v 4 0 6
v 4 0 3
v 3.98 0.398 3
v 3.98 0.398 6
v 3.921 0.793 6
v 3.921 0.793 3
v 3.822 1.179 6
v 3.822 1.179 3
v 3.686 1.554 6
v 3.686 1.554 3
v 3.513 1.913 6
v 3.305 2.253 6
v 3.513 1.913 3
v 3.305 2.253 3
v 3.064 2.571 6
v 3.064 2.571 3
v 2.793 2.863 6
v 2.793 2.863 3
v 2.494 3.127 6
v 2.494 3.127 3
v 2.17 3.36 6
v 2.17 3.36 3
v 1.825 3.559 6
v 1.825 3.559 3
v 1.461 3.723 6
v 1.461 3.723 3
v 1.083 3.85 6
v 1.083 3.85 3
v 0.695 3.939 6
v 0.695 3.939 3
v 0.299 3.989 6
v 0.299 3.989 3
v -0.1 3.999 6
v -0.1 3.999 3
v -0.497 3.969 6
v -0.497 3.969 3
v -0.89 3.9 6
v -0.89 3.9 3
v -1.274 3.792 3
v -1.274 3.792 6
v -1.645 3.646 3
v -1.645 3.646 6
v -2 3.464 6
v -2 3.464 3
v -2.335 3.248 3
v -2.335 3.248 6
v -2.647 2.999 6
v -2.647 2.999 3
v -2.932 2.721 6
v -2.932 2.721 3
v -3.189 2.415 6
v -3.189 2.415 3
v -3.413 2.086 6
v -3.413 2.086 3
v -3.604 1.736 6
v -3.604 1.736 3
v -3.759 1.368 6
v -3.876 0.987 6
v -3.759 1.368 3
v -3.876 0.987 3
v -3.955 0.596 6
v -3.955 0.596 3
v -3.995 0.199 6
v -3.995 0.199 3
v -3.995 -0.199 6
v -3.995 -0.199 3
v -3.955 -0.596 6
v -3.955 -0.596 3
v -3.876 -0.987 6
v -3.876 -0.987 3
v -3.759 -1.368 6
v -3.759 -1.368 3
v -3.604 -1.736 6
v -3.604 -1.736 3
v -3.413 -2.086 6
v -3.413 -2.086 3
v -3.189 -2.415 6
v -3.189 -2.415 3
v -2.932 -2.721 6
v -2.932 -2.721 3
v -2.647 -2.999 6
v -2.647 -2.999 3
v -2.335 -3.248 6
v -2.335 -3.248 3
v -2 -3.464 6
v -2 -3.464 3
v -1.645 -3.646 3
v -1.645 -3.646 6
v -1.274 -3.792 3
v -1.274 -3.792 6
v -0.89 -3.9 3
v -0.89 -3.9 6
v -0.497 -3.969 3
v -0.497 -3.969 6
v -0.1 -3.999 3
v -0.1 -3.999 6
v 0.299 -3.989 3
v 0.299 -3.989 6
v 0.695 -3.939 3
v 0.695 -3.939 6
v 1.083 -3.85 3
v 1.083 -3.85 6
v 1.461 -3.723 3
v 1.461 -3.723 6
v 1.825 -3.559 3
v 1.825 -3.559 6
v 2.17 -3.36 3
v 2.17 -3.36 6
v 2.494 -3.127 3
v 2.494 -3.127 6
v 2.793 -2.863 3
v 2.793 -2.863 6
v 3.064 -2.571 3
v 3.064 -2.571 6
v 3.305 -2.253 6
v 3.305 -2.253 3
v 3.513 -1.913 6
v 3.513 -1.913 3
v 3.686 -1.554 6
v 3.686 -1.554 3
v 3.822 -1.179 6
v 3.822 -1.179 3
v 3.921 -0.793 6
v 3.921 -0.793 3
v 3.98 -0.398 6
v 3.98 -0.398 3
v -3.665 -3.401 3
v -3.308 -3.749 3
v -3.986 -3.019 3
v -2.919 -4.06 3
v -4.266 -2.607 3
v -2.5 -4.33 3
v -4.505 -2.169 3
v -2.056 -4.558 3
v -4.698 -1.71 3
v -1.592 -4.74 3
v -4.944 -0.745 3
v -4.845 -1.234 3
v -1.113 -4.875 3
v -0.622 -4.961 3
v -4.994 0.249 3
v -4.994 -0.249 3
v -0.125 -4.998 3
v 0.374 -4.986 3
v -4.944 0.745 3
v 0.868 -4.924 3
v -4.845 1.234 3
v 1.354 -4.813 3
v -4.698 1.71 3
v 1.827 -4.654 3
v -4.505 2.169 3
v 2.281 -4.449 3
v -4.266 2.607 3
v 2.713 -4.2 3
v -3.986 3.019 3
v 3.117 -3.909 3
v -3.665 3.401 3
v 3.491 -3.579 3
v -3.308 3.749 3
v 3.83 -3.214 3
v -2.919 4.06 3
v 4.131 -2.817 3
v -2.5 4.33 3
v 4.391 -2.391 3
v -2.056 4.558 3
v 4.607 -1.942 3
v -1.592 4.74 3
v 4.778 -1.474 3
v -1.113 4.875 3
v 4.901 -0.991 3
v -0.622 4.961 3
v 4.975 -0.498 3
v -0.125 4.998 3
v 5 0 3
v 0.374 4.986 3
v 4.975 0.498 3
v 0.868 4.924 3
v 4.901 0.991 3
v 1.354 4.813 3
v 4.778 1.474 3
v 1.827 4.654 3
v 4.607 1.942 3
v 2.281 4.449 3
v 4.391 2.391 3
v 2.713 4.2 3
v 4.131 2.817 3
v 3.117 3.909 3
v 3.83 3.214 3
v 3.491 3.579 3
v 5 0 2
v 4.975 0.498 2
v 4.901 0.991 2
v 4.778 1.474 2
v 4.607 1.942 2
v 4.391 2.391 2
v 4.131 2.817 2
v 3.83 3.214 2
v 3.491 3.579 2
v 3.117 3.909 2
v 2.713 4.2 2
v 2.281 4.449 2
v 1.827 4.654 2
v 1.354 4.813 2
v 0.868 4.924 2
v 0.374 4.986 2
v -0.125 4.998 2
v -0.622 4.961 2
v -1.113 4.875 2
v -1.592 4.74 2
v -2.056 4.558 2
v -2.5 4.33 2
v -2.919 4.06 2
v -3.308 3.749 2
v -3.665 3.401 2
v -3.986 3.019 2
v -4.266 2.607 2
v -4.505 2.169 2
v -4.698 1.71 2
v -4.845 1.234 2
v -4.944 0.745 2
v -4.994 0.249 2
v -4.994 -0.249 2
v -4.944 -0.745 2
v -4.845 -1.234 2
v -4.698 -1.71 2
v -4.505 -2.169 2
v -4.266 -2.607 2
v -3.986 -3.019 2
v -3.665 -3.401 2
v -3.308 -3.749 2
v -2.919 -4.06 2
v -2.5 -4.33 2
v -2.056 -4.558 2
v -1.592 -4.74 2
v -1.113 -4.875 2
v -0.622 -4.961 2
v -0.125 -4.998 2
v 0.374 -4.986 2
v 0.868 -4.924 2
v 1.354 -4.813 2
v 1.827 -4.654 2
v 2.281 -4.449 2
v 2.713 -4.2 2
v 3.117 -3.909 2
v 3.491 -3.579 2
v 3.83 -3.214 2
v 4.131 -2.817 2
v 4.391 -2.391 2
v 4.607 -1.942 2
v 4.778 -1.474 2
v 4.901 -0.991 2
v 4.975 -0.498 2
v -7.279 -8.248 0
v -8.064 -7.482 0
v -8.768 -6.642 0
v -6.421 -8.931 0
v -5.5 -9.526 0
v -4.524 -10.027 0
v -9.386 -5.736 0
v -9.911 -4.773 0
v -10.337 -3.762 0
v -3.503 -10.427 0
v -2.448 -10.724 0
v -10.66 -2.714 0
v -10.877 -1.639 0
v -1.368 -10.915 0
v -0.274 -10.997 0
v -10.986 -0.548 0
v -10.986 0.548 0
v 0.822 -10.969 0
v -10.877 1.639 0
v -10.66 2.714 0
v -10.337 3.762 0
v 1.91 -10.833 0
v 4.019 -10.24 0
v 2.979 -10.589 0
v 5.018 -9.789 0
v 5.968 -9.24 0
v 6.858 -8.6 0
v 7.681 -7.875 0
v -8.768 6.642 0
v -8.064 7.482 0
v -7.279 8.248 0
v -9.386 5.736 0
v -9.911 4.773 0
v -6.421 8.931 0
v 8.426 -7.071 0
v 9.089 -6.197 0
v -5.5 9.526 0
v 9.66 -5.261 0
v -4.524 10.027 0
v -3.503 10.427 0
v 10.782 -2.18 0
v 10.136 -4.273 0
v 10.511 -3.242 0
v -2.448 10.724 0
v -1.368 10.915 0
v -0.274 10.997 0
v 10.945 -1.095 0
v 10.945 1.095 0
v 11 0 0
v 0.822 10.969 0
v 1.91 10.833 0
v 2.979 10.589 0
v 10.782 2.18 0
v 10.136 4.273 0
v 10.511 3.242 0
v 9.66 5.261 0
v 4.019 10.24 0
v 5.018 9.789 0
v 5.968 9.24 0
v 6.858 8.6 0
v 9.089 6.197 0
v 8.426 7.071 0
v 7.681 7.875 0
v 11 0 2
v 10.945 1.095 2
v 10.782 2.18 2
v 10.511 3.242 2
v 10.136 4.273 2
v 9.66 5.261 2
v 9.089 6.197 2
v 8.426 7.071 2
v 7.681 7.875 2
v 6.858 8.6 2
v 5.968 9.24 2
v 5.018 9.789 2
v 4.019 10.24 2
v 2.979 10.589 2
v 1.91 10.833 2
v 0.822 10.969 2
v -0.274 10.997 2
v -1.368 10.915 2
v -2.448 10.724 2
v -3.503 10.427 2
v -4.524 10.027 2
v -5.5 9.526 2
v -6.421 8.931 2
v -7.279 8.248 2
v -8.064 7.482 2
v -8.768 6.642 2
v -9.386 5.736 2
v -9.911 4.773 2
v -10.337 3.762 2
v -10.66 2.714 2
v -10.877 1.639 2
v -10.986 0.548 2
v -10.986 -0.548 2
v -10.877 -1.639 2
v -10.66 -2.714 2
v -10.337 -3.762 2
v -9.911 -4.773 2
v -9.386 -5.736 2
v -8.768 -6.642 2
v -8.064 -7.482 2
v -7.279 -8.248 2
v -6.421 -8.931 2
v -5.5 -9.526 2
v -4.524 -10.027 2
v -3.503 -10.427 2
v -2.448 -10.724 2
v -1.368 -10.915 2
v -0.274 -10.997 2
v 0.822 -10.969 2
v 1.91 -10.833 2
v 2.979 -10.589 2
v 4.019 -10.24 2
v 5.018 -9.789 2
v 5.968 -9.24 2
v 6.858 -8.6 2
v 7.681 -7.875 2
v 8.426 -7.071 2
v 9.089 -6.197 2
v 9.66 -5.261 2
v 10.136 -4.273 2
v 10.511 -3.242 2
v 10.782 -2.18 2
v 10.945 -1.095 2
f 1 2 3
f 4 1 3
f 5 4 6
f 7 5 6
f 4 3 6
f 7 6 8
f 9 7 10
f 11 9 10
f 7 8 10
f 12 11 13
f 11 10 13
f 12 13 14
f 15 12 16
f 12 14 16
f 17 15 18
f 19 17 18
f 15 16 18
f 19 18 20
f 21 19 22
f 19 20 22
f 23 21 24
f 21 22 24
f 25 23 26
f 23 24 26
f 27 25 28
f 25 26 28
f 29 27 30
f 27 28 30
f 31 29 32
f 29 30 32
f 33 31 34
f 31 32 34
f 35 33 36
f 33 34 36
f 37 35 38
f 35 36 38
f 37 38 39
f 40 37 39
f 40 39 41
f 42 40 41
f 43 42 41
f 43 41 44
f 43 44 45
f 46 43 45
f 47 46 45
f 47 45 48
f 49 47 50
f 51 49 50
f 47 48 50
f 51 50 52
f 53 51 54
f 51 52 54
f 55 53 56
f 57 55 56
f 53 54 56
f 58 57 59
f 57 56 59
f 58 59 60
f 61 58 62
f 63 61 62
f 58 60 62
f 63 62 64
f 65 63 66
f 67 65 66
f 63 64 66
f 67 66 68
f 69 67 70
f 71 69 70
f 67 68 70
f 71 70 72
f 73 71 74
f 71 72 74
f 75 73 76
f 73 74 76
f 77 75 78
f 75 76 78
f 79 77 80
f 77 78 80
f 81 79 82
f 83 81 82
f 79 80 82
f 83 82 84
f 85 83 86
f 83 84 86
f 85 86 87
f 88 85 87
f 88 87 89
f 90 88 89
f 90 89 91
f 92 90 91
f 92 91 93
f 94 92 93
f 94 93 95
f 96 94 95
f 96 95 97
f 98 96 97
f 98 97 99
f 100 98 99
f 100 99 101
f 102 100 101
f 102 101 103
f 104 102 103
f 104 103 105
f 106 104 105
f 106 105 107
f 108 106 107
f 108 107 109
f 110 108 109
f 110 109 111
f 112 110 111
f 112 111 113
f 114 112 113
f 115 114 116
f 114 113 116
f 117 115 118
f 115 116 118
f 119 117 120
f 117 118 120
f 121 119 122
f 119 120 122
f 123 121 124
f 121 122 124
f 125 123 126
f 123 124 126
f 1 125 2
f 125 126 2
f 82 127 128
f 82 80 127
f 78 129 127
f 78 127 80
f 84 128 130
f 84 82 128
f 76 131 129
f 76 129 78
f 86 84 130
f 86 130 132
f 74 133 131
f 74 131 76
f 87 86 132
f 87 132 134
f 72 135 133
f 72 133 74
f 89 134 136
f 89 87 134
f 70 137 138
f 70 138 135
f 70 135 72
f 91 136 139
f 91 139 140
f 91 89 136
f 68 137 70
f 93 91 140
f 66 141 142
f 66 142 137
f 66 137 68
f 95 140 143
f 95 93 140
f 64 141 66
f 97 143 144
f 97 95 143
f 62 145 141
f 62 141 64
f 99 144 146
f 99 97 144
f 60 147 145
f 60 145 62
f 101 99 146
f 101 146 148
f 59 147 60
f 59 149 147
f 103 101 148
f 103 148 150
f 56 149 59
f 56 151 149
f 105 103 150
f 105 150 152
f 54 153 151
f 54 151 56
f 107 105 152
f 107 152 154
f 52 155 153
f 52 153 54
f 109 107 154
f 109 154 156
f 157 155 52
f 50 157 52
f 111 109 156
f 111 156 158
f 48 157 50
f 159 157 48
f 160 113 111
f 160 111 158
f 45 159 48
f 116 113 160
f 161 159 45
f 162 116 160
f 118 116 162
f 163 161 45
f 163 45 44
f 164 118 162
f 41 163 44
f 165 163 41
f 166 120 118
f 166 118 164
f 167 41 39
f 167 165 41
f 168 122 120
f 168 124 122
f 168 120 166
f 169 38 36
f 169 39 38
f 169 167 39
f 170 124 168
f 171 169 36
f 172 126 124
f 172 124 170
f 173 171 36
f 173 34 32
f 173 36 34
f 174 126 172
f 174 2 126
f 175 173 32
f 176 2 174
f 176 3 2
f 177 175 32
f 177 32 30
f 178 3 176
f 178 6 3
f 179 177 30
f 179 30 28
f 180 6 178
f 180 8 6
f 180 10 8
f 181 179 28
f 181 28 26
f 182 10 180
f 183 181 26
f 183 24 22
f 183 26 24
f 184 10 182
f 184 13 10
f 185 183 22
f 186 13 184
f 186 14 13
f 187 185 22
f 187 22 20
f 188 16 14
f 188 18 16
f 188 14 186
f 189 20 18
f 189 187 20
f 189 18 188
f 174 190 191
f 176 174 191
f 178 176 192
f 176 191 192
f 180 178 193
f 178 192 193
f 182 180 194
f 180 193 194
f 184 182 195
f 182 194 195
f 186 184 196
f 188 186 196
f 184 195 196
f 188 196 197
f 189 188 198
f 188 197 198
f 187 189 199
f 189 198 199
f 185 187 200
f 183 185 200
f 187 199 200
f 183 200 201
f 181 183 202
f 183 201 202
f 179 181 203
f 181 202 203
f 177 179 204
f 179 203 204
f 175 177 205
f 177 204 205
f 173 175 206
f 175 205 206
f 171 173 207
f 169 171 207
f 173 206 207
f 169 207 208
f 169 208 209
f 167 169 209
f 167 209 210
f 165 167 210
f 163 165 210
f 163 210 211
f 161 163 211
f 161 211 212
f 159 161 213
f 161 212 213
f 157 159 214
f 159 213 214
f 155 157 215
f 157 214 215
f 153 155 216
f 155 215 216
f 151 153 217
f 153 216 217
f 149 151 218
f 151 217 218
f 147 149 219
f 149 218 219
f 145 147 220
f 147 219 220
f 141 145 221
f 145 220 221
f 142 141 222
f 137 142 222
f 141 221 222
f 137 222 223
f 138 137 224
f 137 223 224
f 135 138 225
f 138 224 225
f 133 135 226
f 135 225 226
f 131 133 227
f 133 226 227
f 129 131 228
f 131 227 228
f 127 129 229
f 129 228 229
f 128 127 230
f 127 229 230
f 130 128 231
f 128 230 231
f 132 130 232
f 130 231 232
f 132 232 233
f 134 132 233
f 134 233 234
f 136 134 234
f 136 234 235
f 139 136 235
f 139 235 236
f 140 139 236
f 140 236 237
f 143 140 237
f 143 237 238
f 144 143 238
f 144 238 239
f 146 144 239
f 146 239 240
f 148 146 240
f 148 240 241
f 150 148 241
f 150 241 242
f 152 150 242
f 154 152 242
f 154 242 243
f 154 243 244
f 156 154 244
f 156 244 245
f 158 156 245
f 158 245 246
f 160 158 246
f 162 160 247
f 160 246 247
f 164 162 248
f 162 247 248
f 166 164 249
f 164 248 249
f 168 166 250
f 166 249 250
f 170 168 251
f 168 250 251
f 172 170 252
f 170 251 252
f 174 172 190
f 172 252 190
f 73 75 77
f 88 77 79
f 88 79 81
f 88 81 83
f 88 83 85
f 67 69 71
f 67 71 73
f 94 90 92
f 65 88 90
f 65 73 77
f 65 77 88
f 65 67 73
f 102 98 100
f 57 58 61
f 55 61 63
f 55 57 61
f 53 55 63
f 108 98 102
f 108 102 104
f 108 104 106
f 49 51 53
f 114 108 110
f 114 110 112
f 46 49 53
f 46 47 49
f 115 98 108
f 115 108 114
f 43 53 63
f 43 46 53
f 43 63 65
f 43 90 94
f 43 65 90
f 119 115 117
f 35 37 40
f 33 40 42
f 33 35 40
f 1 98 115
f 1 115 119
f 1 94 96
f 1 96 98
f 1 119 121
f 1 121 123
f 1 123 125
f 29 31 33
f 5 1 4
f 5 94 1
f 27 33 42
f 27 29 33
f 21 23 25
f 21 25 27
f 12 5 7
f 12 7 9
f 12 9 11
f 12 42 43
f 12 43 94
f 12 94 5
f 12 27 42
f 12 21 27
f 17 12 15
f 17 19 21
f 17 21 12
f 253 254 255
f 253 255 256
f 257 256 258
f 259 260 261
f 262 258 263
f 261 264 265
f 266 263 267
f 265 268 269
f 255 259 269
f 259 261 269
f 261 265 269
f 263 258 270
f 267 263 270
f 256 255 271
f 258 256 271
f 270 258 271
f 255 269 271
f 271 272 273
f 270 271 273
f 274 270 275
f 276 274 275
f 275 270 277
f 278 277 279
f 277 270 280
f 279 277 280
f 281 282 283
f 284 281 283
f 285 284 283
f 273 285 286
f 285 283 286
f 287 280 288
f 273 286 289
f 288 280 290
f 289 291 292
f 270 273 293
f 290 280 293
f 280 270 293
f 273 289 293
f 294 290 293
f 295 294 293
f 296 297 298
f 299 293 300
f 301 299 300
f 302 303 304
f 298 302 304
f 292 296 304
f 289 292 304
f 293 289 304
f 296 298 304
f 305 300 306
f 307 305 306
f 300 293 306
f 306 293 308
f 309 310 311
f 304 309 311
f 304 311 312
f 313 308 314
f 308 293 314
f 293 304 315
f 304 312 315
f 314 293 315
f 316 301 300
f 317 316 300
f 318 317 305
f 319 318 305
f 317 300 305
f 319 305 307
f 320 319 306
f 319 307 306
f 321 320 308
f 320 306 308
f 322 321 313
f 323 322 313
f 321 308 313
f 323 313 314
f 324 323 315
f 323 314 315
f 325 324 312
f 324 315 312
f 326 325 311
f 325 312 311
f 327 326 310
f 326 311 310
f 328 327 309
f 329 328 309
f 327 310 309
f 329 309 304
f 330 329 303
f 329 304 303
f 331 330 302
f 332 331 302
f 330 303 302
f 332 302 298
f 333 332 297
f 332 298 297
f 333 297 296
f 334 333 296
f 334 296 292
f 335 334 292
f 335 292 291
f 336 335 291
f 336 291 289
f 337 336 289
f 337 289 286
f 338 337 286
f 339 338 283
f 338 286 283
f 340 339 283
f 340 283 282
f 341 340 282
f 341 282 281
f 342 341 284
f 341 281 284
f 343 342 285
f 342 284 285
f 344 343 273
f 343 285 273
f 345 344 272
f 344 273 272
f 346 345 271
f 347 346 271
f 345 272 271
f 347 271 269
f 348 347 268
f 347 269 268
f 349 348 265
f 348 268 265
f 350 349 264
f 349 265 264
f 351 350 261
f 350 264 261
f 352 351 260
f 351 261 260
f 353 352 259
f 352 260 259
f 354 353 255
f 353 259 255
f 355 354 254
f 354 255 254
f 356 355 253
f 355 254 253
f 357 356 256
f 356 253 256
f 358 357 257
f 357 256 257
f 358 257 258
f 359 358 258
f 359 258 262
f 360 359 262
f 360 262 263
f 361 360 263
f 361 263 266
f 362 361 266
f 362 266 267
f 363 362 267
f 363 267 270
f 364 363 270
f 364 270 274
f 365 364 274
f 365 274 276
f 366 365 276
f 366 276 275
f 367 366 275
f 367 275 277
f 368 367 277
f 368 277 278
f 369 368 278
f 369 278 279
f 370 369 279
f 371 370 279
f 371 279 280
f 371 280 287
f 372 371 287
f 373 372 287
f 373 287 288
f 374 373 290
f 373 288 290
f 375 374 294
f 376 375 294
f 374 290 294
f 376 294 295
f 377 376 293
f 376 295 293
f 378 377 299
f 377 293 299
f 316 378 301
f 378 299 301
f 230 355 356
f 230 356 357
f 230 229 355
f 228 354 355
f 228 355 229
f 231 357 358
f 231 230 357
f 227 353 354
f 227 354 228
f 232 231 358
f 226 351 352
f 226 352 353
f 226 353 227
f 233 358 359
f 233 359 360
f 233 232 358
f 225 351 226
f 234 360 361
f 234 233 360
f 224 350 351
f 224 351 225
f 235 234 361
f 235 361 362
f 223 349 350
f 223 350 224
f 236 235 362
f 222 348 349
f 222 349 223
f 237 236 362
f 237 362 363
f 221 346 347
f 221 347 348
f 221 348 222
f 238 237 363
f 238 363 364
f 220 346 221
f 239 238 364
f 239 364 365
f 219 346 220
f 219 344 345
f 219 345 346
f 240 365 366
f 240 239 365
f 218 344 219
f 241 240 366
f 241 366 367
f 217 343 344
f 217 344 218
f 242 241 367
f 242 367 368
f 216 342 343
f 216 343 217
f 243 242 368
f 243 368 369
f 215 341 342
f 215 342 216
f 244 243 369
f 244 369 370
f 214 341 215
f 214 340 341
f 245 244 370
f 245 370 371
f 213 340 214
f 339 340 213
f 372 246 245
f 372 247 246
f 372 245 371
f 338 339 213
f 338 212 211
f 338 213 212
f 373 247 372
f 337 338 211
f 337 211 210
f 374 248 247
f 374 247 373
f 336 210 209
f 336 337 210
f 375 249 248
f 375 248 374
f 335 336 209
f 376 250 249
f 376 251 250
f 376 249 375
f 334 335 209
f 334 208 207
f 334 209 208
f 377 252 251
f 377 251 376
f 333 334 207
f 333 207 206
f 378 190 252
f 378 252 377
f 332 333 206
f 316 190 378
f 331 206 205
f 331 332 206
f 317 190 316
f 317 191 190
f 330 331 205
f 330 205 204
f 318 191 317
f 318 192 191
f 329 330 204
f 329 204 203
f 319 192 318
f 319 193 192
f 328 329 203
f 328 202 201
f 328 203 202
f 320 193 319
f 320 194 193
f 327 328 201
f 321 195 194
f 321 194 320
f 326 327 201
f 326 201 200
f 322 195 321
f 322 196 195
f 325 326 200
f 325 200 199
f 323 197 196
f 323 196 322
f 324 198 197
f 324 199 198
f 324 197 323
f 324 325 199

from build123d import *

# Parameters (mm, degrees)
F0_R     = 11
F1_DEPTH = 2
F2_R     = 5
F3_DEPTH = 1
F4_R     = 4
F5_DEPTH = 3


with BuildPart() as f1:
    # F0 (on Top) → F1 (new body)
    with BuildSketch(Plane.XY):
        Circle(F0_R)
    extrude(amount=F1_DEPTH)

    # F2 (on face) → F3 (join)
    with BuildSketch(Plane.XY.offset(2)):
        Circle(F2_R)
    extrude(amount=F3_DEPTH)

    # F4 (on face) → F5 (join)
    with BuildSketch(Plane.XY.offset(3)):
        Circle(F4_R)
    extrude(amount=F5_DEPTH)


solid = f1.part
